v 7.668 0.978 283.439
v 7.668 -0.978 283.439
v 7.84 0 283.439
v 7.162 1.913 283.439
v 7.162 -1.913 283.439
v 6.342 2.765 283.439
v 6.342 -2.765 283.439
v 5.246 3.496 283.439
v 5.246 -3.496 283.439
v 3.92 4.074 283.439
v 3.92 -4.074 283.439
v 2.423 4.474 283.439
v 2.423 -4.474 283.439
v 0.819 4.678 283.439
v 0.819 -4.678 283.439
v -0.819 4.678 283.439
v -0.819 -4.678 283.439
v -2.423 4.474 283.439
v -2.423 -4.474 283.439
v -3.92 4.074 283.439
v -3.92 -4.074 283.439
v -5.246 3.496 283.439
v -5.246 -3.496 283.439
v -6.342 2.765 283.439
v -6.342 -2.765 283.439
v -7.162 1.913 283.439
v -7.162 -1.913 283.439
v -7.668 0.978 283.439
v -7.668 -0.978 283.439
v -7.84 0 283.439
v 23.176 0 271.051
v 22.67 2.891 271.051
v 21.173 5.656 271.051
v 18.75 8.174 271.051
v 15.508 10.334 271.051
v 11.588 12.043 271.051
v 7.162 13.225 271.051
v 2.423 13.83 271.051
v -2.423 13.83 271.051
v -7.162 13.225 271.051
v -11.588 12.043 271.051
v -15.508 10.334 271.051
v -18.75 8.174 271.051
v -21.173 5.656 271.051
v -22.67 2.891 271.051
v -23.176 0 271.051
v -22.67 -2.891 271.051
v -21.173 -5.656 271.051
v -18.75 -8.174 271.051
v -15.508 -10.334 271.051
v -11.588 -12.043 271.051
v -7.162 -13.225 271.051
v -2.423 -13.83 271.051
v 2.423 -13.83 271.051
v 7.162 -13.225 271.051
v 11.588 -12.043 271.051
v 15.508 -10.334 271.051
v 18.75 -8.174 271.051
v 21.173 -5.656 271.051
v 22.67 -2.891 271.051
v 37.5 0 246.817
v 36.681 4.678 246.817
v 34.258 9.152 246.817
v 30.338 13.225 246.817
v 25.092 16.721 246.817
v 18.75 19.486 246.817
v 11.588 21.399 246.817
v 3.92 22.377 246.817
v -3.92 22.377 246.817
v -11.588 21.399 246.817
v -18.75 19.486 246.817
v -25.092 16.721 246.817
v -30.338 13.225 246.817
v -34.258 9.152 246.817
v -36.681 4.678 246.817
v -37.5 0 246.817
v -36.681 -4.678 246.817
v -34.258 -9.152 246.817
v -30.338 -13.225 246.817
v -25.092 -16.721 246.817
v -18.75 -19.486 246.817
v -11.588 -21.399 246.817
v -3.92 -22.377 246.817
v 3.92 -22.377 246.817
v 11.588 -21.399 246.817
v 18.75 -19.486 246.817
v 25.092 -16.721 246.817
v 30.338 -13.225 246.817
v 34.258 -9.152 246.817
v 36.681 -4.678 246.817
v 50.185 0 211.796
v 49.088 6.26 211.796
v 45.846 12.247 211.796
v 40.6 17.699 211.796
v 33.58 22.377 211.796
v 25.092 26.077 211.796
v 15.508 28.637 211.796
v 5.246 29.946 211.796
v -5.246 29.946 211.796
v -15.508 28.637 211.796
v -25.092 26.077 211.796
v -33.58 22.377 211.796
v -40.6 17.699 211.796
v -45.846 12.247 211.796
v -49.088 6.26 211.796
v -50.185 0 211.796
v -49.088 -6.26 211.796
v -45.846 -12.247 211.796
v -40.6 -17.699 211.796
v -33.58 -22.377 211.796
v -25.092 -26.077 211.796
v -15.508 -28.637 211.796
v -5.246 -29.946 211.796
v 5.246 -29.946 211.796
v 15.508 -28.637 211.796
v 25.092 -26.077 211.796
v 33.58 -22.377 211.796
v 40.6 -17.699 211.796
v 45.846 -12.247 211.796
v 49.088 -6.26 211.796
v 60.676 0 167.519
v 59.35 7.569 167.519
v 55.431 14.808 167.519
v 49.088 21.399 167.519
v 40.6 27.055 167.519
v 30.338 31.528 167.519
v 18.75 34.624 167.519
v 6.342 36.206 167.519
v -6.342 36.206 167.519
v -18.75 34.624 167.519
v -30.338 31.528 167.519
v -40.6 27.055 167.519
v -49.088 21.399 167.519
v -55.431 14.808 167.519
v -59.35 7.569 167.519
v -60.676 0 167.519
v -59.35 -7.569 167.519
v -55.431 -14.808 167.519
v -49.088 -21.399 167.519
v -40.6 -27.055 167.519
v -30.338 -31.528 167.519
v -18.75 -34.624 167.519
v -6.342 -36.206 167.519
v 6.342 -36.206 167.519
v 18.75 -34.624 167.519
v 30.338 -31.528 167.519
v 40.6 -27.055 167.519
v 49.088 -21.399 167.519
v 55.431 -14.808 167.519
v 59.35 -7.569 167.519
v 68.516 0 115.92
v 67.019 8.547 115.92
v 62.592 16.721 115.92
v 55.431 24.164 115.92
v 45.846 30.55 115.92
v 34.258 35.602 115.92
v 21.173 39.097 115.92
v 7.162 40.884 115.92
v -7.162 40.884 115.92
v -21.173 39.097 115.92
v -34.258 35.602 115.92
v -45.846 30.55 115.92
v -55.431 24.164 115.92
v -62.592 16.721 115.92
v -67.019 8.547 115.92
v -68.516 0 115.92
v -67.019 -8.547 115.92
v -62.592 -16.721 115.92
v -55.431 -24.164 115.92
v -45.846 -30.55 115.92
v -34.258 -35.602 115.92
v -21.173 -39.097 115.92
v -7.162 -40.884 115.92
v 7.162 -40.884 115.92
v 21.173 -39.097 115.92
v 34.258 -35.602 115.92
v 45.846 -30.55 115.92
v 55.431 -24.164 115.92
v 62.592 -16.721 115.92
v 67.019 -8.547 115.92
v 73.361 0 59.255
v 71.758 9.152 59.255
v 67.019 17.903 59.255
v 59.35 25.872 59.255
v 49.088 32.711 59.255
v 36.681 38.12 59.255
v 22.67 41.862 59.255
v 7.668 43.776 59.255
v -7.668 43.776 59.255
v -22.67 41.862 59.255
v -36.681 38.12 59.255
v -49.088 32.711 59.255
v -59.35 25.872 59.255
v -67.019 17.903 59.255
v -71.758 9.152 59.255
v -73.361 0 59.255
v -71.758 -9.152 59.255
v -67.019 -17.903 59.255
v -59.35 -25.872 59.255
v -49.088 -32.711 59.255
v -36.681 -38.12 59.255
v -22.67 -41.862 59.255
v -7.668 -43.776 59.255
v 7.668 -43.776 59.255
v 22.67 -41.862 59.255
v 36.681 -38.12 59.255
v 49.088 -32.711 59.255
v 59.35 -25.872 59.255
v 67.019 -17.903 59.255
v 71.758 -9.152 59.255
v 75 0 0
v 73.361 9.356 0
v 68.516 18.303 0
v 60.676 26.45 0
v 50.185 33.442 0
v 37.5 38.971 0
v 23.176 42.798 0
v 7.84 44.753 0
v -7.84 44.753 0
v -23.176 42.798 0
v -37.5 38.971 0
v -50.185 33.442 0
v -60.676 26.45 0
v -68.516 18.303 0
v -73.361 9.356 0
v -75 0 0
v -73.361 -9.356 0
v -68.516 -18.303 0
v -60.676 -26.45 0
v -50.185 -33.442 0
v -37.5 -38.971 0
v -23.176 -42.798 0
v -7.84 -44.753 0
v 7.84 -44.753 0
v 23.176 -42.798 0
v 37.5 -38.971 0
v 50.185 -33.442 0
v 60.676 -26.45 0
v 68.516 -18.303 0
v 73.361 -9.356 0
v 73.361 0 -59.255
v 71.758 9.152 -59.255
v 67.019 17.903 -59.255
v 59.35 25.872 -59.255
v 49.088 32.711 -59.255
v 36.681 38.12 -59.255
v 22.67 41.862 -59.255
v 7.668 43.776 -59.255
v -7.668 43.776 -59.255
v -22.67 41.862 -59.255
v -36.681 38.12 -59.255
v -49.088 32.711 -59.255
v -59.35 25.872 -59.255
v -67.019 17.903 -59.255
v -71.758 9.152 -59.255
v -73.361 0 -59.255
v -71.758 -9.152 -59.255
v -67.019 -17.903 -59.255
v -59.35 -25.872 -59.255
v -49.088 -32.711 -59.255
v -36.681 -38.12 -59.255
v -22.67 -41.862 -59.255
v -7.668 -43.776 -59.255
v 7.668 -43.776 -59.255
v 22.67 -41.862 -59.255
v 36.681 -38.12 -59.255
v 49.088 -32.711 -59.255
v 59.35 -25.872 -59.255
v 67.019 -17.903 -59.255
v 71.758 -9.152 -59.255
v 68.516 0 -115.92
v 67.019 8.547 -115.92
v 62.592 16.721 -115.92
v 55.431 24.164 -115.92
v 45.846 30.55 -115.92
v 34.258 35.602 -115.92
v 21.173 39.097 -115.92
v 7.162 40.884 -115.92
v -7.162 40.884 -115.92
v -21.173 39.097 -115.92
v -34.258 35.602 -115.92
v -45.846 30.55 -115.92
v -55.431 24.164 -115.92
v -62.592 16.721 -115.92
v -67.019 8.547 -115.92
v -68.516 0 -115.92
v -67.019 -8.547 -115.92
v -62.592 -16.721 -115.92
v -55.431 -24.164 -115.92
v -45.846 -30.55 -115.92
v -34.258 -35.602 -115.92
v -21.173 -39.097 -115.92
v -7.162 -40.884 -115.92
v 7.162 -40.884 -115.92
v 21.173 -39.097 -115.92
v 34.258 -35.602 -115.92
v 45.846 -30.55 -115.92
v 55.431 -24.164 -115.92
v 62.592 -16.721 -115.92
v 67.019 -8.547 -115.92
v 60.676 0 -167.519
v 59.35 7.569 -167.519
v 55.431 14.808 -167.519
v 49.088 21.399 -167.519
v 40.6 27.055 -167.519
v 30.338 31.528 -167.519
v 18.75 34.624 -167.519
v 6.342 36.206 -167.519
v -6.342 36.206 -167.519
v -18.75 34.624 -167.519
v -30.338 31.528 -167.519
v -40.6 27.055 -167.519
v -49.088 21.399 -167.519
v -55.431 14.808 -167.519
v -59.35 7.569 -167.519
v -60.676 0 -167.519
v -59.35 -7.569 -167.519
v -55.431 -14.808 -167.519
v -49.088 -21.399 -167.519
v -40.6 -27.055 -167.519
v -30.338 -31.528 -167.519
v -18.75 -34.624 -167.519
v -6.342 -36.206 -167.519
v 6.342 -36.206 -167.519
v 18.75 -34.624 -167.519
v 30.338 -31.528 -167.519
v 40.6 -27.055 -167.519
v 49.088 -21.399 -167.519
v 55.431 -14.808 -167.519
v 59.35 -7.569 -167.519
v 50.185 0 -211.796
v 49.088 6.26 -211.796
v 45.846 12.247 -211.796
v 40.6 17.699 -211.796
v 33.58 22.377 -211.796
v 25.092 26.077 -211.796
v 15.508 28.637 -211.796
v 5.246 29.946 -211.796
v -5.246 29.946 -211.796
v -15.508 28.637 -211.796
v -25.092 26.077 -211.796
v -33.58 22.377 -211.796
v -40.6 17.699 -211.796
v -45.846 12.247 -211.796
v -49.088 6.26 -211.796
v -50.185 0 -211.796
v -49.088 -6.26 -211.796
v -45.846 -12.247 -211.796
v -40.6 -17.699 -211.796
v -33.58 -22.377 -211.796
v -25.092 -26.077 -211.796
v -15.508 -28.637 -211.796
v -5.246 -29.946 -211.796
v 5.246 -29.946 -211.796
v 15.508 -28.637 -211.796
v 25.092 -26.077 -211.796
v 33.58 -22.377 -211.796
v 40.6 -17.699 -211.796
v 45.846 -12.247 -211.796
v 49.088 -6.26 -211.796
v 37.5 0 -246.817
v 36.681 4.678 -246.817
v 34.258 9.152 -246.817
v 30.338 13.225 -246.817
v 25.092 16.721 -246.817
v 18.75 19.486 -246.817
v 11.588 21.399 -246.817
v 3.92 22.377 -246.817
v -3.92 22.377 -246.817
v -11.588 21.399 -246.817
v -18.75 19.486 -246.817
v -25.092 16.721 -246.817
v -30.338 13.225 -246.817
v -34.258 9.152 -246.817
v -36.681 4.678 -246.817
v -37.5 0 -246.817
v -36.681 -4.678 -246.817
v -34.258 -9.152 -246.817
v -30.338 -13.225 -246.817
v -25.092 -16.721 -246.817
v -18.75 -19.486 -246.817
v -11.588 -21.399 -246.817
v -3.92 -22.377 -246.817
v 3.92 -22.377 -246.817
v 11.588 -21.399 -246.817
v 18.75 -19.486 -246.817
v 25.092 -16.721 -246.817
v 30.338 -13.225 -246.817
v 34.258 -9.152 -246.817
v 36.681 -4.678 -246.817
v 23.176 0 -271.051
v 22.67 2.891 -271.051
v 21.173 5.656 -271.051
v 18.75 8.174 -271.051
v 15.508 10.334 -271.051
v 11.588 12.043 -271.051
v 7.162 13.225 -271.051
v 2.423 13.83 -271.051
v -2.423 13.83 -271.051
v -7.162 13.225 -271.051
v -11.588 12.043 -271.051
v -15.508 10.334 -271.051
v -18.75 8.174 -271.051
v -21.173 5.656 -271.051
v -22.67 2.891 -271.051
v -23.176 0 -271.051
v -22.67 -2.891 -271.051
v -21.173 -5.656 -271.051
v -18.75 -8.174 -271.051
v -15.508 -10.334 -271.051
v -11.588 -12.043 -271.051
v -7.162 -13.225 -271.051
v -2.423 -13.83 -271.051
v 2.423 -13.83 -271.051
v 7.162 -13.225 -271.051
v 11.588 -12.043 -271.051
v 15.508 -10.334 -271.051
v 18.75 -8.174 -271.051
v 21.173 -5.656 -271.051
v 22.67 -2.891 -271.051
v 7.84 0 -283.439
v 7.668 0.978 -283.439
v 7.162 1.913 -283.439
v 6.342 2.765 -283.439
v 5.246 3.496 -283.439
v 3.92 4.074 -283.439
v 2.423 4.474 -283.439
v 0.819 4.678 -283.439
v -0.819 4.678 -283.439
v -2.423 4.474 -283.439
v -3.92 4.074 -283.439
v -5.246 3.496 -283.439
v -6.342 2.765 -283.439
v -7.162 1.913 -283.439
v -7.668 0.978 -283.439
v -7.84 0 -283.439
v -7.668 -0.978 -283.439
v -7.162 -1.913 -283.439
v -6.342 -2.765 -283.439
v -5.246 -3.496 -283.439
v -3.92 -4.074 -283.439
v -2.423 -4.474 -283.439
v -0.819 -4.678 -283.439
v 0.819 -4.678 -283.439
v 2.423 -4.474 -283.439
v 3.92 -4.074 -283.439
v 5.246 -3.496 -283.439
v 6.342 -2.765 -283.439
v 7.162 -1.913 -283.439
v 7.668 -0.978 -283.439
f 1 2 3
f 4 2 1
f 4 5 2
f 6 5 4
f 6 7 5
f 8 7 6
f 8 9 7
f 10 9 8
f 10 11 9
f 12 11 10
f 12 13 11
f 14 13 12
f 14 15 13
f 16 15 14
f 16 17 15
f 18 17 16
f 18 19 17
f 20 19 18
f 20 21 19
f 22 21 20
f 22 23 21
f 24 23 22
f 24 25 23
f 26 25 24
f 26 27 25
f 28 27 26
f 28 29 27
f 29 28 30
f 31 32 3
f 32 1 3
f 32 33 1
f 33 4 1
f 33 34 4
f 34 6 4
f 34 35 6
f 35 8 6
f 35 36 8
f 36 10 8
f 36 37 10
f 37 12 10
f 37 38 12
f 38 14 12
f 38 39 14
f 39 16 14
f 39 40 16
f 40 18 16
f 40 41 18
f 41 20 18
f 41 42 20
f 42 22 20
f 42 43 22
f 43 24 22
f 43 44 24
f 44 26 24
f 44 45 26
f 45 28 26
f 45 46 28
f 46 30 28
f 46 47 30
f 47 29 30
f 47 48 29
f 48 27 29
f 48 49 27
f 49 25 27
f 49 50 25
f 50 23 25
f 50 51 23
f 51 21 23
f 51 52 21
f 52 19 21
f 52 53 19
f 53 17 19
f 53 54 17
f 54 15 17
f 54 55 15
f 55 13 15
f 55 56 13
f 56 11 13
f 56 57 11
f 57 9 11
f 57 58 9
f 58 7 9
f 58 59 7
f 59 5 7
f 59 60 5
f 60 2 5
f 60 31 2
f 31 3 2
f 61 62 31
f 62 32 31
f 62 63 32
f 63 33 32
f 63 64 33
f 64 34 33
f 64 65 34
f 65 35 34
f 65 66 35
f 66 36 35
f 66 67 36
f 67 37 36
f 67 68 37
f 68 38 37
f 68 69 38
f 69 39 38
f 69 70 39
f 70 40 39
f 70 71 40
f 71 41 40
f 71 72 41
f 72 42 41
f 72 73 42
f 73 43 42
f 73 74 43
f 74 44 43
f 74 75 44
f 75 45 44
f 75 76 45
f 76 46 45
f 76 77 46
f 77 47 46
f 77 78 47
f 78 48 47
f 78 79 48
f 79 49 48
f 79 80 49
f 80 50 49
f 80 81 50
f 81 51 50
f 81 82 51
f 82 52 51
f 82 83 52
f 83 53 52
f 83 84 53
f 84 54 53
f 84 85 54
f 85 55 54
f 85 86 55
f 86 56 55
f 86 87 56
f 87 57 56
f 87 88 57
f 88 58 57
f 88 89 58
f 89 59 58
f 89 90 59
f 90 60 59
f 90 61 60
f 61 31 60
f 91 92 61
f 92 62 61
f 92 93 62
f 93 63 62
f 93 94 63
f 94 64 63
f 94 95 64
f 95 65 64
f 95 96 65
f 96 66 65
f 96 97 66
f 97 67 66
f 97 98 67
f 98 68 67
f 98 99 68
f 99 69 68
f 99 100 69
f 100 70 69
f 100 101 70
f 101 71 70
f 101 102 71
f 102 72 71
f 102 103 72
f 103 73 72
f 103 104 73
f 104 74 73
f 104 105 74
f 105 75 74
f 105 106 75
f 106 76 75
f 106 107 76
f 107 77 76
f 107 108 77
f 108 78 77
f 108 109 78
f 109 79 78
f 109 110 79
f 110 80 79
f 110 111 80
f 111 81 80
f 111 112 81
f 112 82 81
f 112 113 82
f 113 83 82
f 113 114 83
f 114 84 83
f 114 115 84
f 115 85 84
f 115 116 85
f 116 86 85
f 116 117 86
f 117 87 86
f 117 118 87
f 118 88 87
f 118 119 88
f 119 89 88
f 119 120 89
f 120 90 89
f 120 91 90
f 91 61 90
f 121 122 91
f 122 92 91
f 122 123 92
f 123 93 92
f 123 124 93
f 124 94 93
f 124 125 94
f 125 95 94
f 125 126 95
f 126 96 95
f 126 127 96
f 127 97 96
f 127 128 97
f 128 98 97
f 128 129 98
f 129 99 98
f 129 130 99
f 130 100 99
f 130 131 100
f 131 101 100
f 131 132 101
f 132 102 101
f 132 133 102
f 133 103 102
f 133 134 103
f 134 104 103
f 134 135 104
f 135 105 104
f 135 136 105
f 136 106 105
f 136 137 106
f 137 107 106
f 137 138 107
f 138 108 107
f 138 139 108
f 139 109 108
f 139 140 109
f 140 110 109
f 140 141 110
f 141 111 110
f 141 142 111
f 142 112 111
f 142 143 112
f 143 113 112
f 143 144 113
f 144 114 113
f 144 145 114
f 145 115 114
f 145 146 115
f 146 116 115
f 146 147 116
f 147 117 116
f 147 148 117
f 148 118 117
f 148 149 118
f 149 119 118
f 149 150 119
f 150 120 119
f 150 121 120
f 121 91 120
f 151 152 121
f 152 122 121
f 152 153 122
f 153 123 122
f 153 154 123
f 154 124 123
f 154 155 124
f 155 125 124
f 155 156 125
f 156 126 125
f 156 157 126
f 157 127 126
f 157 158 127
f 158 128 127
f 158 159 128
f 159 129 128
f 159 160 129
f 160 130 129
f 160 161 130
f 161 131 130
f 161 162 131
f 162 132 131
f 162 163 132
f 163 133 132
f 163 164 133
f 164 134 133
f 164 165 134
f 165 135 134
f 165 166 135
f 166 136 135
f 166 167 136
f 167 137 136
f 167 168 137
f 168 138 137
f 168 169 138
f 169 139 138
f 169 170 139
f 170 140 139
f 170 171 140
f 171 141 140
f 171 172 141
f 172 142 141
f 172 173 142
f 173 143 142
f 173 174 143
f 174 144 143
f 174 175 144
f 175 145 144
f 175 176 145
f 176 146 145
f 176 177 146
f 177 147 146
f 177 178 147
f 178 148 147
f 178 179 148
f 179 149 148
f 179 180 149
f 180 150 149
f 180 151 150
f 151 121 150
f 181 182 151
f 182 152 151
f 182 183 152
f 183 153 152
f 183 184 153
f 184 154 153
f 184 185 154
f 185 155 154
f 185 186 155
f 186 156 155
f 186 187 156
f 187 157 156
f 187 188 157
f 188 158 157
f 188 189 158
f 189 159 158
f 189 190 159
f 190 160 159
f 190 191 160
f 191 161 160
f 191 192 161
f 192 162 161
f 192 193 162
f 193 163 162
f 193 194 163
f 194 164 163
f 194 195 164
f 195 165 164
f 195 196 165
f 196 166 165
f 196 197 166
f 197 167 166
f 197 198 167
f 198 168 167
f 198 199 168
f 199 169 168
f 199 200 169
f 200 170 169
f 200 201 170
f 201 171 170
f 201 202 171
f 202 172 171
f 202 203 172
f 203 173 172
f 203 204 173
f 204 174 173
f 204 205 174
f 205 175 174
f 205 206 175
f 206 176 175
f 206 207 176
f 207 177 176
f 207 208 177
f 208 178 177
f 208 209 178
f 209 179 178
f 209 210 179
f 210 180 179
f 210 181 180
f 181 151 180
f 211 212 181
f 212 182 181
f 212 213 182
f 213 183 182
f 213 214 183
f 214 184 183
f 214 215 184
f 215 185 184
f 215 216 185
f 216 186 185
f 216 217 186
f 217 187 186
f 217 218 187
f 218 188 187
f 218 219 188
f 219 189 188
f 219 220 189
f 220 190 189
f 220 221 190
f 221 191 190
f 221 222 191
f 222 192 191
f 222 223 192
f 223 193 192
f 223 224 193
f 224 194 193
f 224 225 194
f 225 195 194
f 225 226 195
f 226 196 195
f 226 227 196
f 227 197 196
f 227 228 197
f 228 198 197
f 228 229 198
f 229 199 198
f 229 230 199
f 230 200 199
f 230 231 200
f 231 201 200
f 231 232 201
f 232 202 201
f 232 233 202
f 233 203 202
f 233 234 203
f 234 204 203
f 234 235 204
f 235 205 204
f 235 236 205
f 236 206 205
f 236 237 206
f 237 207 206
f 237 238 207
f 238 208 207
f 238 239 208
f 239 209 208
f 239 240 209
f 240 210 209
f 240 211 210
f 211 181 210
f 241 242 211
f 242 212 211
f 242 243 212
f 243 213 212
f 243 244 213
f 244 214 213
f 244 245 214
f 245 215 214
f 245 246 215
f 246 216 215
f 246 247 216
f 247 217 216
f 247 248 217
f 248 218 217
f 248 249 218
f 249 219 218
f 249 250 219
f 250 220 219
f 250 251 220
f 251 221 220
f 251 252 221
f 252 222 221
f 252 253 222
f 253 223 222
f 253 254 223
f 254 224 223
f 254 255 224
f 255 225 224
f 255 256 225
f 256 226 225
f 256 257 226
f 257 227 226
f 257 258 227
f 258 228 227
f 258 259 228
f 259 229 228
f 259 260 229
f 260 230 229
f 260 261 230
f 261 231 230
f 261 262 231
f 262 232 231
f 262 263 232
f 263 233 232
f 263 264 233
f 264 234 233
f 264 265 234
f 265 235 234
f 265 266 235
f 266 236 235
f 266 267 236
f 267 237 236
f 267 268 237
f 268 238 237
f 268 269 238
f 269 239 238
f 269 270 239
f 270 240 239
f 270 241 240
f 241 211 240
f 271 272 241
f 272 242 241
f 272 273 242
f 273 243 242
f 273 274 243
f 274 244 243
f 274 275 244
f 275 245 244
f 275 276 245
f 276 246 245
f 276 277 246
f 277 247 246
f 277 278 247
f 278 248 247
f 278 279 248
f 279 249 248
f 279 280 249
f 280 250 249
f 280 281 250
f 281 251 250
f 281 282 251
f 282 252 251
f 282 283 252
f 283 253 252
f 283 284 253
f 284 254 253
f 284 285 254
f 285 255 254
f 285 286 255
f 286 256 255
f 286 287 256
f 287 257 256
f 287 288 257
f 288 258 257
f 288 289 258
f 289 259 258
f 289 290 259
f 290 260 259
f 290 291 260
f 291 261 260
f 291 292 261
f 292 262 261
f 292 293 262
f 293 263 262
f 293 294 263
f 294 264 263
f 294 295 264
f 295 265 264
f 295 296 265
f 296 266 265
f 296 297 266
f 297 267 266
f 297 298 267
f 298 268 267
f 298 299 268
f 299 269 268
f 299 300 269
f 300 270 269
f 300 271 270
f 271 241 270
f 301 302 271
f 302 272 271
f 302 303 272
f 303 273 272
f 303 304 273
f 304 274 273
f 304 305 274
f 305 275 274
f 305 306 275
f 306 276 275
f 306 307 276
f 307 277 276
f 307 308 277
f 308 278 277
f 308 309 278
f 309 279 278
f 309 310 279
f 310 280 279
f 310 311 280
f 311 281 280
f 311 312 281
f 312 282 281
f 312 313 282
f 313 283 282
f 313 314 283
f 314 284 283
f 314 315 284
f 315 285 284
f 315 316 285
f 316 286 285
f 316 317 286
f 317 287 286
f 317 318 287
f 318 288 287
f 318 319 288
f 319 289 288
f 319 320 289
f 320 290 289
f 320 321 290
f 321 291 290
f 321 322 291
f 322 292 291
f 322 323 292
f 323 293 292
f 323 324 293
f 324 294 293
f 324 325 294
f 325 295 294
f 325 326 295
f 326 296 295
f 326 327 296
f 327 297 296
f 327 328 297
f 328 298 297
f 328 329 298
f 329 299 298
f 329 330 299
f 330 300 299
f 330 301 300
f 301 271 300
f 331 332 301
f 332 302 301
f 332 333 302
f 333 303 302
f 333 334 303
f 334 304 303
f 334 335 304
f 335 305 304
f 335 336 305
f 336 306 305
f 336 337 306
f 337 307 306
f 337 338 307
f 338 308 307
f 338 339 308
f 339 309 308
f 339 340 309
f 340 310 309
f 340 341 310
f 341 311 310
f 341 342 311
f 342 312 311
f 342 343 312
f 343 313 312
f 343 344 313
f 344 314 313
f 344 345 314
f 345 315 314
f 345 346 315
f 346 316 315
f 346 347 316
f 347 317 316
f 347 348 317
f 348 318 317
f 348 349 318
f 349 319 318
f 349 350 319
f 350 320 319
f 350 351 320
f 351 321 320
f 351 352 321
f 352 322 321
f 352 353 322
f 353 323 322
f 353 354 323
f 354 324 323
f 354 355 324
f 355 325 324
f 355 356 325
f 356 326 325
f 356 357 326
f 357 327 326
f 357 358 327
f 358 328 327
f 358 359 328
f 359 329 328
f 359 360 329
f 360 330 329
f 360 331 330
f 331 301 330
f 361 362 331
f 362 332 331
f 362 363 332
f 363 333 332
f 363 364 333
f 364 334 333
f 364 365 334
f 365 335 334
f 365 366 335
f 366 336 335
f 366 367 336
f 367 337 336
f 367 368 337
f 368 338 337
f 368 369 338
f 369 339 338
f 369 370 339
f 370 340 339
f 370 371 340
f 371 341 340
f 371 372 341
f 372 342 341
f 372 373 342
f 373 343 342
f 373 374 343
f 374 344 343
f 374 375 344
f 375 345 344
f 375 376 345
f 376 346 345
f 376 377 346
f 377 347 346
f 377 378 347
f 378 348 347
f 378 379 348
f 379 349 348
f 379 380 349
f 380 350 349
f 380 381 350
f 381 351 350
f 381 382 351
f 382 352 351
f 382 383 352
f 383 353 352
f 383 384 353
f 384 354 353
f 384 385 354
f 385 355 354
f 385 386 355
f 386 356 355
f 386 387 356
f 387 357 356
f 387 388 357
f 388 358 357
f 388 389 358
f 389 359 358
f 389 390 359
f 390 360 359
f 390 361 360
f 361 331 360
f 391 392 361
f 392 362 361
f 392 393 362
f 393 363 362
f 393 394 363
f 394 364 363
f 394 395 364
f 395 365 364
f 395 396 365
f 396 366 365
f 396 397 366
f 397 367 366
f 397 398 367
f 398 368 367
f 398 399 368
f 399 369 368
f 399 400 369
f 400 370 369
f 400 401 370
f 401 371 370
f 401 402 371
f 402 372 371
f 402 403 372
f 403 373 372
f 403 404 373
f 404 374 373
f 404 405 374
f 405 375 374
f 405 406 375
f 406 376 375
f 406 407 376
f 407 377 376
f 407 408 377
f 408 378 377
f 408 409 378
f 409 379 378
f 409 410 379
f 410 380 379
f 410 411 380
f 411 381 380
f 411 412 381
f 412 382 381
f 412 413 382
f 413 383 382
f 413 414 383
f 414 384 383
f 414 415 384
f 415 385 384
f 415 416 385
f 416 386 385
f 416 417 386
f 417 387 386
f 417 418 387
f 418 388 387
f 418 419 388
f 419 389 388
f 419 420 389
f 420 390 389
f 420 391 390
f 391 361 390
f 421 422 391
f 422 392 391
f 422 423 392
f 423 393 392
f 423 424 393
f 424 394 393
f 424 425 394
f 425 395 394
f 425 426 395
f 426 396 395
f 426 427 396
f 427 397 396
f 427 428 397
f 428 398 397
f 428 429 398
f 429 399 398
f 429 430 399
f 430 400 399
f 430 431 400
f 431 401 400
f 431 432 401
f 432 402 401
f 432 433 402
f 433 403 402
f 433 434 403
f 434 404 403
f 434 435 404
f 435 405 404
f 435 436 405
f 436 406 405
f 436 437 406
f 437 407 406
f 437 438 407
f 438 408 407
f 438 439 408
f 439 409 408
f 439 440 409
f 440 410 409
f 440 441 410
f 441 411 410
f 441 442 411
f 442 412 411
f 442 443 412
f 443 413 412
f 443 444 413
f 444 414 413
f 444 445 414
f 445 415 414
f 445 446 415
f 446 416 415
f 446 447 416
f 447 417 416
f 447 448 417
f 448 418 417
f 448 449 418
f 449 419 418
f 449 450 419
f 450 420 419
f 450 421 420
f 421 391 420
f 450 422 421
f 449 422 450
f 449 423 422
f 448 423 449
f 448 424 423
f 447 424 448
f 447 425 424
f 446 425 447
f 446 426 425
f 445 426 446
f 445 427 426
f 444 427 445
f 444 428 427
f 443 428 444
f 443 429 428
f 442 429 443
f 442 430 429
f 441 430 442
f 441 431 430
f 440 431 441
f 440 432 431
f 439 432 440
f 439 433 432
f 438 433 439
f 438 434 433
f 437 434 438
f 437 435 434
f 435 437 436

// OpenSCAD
// Generated by SolidPython 1.0.1 on 2020-07-29 00:46:46


scale(v = [5, 3, 19]) {
	sphere(r = 15);
}
/***********************************************
*********      SolidPython code:      **********
************************************************
 
# import packages: SolidPython
from solid import *
from solid.utils import *
from itertools import chain, combinations, permutations


class Resize:

    def __init__(self, scad_file):
        self.scad_file = scad_file
        #self.scad_file = import_scad(scad_file)
        # cone/cylinder param:
        self.r1 = 0
        self.r2 = 0
        self.h = 0
        # rectangular prism param:
        self.w = 0
        self.l = 0
        # ellipse param:
        self.r = 0

    # import OpenScad code (file name corresponds to shape)


    # classify shape + parameters
    def assign(self, param1, param2, param3):
        if self.scad_file == 'cone.scad':
            self.r1 = param1
            self.r2 = param2
            self.h = param3
        elif self.scad_file == 'cylinder.scad':
            self.r1 = param1
            self.r2 = param2
            self.h = param3
        elif self.scad_file == 'rectangularPrism.scad':
            self.h = param1
            self.l = param2
            self.w = param3
        else:
            self.r = param1
            self.h = param2

    # resize parameters
    def iterate(self):
        x = range(3, 20, 2)
        i = 1
        if self.scad_file == 'cone.scad':
            tempList = list(permutations(x, 2))
            for temp in tempList:
                param1 = temp[0]
                param2 = temp[1]
                filepath = 'produced_scad_files/' + 'cone' + str(param1) + '_' + str(param2) + '_' + '.scad'
                scad_render_to_file(cylinder(h=param1, r1=param2, r2=0), filepath)

        elif self.scad_file == 'cylinder.scad':
            tempList = list(permutations(x, 3))
            for temp in tempList:
                param1 = temp[0]
                param2 = temp[1]
                filepath = 'produced_scad_files/' + 'cylinder' + str(param1) + '_' + str(param2) + '_' + '.scad'
                scad_render_to_file(cylinder(h=param1, r1=param2, r2=param2), filepath)

        elif self.scad_file == 'rectangularPrism.scad':
            tempList = list(permutations(x, 3))
            for temp in tempList:
                param1 = temp[0]
                param2 = temp[1]
                param3 = temp[2]
                filepath = 'produced_scad_files/' + 'rectangularPrism' + str(param1) + '_' + str(param2) + '_' + str(
                    param3) + '.scad'
                scad_render_to_file(cube(size=(param1, param2, param3)), filepath)

        elif self.scad_file == 'ellipse.scad':
            tempList = list(permutations(x, 4))
            for temp in tempList:
                param1 = temp[0]
                param2 = temp[1]
                param3 = temp[2]
                param4 = temp[3]
                filepath = 'produced_scad_files/' + 'ellipse' + str(param1) + '_' + str(param2) + '_' + str(param3) + '_' + str(param4) + '.scad'
                scad_render_to_file(scale([param1, param2, param3])(sphere(r=param4)), filepath)

    def render_to_scadfile(self):
        scad_render_to_file(scad, 'example.scad') 
 
************************************************/
